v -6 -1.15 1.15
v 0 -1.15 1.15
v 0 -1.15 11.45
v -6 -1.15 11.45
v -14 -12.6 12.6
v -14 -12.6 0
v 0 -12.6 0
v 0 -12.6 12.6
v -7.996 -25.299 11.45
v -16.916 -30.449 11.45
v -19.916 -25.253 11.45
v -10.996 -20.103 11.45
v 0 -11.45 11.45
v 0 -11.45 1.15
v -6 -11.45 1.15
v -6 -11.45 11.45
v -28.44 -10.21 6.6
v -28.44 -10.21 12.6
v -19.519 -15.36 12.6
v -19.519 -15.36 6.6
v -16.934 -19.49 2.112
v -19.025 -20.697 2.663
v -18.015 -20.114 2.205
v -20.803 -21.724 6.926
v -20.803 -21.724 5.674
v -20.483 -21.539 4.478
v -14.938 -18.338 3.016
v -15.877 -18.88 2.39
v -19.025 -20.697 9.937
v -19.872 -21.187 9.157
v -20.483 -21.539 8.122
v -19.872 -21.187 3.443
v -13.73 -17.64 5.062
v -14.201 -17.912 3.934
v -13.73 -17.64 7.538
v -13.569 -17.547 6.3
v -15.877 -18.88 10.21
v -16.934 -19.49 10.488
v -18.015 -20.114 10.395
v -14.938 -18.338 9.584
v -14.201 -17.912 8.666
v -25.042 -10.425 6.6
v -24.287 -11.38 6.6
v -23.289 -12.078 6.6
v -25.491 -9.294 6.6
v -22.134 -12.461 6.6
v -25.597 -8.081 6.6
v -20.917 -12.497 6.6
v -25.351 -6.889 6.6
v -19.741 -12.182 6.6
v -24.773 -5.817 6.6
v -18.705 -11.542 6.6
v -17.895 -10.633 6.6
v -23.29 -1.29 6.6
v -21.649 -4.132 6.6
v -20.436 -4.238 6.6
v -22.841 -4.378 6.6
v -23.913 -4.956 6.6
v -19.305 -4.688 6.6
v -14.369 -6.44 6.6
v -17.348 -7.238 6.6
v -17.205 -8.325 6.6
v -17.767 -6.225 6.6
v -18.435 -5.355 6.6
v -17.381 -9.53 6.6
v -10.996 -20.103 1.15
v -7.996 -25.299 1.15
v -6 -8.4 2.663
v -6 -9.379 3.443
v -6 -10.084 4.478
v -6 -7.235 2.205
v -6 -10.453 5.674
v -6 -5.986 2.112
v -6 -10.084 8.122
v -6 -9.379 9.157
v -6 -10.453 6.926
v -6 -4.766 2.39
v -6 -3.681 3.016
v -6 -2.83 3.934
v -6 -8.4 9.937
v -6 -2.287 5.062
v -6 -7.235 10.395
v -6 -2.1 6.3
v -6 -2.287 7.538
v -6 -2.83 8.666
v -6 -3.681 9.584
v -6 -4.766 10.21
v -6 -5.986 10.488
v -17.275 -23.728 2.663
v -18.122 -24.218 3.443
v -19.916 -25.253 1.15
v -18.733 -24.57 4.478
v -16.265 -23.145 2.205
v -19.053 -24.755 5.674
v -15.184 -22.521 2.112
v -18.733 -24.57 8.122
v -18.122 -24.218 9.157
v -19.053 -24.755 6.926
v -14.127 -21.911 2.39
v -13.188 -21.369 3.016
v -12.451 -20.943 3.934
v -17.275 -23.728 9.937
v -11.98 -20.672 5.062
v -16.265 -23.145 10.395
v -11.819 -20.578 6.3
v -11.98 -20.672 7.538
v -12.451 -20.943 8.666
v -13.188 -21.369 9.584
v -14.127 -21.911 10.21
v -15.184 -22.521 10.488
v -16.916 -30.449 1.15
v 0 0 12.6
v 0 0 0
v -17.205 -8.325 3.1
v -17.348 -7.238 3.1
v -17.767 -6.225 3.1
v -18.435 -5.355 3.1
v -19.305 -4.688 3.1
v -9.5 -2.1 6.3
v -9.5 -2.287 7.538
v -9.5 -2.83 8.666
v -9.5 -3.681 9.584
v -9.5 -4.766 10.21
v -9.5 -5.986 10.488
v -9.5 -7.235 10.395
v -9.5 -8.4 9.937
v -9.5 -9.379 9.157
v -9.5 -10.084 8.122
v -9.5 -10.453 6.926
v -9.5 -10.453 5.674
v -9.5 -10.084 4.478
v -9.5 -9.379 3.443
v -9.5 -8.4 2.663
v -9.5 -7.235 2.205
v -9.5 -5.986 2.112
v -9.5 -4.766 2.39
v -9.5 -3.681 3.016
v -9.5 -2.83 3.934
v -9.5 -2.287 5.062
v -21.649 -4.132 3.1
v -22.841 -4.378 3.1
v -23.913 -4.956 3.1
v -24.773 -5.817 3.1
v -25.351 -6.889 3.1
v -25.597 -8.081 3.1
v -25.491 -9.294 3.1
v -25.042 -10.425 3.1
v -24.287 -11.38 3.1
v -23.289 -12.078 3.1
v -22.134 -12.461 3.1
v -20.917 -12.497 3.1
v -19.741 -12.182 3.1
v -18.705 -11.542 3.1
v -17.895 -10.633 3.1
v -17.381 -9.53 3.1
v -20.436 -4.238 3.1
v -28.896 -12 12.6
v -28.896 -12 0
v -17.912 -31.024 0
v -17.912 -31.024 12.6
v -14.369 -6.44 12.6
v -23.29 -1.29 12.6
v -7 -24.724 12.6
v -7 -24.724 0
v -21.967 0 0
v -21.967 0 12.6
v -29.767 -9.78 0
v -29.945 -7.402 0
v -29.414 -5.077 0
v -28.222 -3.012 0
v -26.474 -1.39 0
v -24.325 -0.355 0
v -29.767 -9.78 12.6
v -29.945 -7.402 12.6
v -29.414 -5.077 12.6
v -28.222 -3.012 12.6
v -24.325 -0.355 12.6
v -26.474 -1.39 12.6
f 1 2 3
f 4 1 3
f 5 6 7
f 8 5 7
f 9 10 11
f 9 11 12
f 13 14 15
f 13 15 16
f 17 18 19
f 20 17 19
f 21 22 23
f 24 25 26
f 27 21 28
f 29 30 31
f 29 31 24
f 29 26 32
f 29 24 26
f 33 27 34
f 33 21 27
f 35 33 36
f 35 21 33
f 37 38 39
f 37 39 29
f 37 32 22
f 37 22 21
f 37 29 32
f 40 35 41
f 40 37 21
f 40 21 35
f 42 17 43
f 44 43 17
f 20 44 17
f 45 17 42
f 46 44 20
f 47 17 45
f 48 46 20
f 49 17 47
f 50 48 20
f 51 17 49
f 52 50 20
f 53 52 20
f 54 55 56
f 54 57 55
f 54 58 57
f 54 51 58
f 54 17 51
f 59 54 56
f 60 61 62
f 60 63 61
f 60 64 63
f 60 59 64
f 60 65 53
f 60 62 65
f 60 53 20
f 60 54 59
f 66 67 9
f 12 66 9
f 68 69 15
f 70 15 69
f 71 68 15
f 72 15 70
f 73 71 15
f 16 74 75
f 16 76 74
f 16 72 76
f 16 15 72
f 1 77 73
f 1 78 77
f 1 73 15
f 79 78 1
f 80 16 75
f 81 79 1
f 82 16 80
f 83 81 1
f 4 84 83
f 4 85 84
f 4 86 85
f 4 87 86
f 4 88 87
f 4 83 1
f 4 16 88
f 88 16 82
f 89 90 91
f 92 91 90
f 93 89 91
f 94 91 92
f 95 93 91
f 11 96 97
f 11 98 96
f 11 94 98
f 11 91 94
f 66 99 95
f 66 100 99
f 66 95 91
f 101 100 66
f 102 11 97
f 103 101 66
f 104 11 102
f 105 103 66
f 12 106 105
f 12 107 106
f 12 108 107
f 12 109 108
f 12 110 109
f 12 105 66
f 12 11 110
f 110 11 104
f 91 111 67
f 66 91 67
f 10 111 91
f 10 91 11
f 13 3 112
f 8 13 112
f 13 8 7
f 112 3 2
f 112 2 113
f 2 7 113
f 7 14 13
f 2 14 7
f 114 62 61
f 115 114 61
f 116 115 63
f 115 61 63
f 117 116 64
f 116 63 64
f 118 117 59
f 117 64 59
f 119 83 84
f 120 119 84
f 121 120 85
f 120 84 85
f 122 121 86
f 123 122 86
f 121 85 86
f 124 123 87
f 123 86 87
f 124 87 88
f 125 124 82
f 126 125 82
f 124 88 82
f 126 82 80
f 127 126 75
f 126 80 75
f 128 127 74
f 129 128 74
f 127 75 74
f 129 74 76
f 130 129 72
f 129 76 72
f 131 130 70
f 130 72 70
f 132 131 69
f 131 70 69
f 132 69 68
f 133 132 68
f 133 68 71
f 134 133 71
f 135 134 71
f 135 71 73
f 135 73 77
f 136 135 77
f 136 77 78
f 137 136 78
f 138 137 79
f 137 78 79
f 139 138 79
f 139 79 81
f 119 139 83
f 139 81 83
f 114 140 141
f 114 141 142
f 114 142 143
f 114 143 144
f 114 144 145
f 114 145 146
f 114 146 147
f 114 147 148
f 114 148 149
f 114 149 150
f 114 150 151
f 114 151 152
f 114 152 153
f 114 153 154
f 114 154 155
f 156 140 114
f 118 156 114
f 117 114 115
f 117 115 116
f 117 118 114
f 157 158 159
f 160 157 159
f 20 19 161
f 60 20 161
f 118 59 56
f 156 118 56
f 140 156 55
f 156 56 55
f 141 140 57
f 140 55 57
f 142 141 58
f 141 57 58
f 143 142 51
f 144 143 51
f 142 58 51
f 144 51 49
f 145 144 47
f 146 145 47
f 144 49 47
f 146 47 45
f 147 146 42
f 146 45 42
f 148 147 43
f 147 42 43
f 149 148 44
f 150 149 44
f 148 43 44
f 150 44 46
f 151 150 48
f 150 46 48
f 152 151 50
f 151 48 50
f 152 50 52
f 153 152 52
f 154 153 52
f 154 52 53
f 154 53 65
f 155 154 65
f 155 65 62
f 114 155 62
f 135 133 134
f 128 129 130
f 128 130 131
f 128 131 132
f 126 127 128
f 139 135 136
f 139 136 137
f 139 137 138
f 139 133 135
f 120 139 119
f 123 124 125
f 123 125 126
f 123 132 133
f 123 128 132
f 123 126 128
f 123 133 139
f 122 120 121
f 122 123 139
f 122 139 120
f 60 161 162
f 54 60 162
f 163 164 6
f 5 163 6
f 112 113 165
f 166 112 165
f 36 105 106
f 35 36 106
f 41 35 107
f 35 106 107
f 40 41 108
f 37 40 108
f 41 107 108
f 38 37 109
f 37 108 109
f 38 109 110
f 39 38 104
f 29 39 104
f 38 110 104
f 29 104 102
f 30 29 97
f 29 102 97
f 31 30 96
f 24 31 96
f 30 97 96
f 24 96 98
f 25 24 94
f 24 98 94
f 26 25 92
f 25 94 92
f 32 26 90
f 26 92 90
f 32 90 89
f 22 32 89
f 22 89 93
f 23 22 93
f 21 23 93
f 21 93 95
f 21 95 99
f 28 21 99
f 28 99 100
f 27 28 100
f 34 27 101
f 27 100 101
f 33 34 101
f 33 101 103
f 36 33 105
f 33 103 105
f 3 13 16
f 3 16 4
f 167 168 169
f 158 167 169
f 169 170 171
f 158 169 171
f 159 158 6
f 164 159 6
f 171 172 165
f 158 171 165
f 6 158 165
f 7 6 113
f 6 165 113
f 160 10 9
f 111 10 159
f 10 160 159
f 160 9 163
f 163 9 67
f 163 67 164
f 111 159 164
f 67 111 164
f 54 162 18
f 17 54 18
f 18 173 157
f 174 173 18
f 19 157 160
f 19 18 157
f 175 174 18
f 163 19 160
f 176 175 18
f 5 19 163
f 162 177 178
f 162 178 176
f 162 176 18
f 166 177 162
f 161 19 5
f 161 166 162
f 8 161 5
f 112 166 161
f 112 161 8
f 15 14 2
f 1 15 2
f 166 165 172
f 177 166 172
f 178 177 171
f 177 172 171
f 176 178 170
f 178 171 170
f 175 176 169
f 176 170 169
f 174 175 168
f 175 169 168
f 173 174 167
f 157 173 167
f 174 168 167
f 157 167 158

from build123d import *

# Parameters (mm, degrees)
F1_DEPTH  = 12.6
F2_W      = 10.3
F2_H      = 10.3
F3_DEPTH  = 6
F4_W      = 10.3
F4_H      = 10.3
F5_DEPTH  = 6
F6_R      = 4.2
F7_DEPTH  = 3.5
F8_R      = 4.2
F9_DEPTH  = 3.5
F11_DEPTH = 6
F13_DEPTH = 3.5


with BuildPart() as f1:
    # F0 (on Top) → F1 (new body)
    with BuildSketch(Plane.XY):
        with BuildLine():
            Line((0, -12.6), (0, 0))
            Line((0, 0), (-21.9674337148, 0))
            ThreePointArc((-21.9674337148, 0), (-28.8956369451, -4), (-28.8956369451, -12))
            Line((-28.8956369451, -12), (-17.9119200877, -31.024355653))
            Line((-17.9119200877, -31.024355653), (-7, -24.724355653))
            Line((-7, -24.724355653), (-14, -12.6))
            Line((-14, -12.6), (0, -12.6))
        make_face()
    extrude(amount=F1_DEPTH)

    # F2 (on face) → F3 (cut)
    with BuildSketch(Plane(origin=(8.9559600438, -15.5121778265, 0), x_dir=(0.8660254038, 0.5, 0), z_dir=(0.5, -0.8660254038, 0))):
        with Locations((-24.724355653, 6.3)):
            Rectangle(F2_W, F2_H)
    extrude(amount=-F3_DEPTH, mode=Mode.SUBTRACT)

    # F4 (on face) → F5 (cut)
    with BuildSketch(Plane.YZ):
        with Locations((-6.3, 6.3)):
            Rectangle(F4_W, F4_H)
    extrude(amount=-F5_DEPTH, mode=Mode.SUBTRACT)

    # F6 (on face) → F7 (cut)
    with BuildSketch(Plane.YZ.offset(-6)):
        with Locations((-6.3, 6.3)):
            Circle(F6_R)
    extrude(amount=-F7_DEPTH, mode=Mode.SUBTRACT)

    # F8 (on face) → F9 (cut)
    with BuildSketch(Plane(origin=(5.9559600438, -10.3160254038, 0), x_dir=(0.8660254038, 0.5, 0), z_dir=(0.5, -0.8660254038, 0))):
        with Locations((-24.724355653, 6.3)):
            Circle(F8_R)
    extrude(amount=-F9_DEPTH, mode=Mode.SUBTRACT)

    # F10 (on face) → F11 (cut)
    with BuildSketch(Plane.XY.offset(12.6)):
        Polygon((-19.5194863729, -15.3600308295), (-14.3694863729, -6.4399691705), (-23.2895480318, -1.2899691705), (-25.8645480318, -5.75), (-28.4395480318, -10.2100308295), align=None)
    extrude(amount=-F11_DEPTH, mode=Mode.SUBTRACT)

    # F12 (on face) → F13 (cut)
    with BuildSketch(Plane.XY.offset(6.6)):
        with BuildLine():
            ThreePointArc((-17.2045172024, -8.325), (-17.7672105065, -6.225), (-19.3045172024, -4.6876933041))
            Line((-19.3045172024, -4.6876933041), (-21.4045172024, -8.325))
            Line((-21.4045172024, -8.325), (-23.5045172024, -11.9623066959))
            ThreePointArc((-23.5045172024, -11.9623066959), (-19.3045172024, -11.9623066959), (-17.2045172024, -8.325))
        make_face()
        with BuildLine():
            Line((-21.4045172024, -8.325), (-19.3045172024, -4.6876933041))
            ThreePointArc((-19.3045172024, -4.6876933041), (-25.0418238983, -6.225), (-23.5045172024, -11.9623066959))
            Line((-23.5045172024, -11.9623066959), (-21.4045172024, -8.325))
        make_face()
    extrude(amount=-F13_DEPTH, mode=Mode.SUBTRACT)


solid = f1.part
